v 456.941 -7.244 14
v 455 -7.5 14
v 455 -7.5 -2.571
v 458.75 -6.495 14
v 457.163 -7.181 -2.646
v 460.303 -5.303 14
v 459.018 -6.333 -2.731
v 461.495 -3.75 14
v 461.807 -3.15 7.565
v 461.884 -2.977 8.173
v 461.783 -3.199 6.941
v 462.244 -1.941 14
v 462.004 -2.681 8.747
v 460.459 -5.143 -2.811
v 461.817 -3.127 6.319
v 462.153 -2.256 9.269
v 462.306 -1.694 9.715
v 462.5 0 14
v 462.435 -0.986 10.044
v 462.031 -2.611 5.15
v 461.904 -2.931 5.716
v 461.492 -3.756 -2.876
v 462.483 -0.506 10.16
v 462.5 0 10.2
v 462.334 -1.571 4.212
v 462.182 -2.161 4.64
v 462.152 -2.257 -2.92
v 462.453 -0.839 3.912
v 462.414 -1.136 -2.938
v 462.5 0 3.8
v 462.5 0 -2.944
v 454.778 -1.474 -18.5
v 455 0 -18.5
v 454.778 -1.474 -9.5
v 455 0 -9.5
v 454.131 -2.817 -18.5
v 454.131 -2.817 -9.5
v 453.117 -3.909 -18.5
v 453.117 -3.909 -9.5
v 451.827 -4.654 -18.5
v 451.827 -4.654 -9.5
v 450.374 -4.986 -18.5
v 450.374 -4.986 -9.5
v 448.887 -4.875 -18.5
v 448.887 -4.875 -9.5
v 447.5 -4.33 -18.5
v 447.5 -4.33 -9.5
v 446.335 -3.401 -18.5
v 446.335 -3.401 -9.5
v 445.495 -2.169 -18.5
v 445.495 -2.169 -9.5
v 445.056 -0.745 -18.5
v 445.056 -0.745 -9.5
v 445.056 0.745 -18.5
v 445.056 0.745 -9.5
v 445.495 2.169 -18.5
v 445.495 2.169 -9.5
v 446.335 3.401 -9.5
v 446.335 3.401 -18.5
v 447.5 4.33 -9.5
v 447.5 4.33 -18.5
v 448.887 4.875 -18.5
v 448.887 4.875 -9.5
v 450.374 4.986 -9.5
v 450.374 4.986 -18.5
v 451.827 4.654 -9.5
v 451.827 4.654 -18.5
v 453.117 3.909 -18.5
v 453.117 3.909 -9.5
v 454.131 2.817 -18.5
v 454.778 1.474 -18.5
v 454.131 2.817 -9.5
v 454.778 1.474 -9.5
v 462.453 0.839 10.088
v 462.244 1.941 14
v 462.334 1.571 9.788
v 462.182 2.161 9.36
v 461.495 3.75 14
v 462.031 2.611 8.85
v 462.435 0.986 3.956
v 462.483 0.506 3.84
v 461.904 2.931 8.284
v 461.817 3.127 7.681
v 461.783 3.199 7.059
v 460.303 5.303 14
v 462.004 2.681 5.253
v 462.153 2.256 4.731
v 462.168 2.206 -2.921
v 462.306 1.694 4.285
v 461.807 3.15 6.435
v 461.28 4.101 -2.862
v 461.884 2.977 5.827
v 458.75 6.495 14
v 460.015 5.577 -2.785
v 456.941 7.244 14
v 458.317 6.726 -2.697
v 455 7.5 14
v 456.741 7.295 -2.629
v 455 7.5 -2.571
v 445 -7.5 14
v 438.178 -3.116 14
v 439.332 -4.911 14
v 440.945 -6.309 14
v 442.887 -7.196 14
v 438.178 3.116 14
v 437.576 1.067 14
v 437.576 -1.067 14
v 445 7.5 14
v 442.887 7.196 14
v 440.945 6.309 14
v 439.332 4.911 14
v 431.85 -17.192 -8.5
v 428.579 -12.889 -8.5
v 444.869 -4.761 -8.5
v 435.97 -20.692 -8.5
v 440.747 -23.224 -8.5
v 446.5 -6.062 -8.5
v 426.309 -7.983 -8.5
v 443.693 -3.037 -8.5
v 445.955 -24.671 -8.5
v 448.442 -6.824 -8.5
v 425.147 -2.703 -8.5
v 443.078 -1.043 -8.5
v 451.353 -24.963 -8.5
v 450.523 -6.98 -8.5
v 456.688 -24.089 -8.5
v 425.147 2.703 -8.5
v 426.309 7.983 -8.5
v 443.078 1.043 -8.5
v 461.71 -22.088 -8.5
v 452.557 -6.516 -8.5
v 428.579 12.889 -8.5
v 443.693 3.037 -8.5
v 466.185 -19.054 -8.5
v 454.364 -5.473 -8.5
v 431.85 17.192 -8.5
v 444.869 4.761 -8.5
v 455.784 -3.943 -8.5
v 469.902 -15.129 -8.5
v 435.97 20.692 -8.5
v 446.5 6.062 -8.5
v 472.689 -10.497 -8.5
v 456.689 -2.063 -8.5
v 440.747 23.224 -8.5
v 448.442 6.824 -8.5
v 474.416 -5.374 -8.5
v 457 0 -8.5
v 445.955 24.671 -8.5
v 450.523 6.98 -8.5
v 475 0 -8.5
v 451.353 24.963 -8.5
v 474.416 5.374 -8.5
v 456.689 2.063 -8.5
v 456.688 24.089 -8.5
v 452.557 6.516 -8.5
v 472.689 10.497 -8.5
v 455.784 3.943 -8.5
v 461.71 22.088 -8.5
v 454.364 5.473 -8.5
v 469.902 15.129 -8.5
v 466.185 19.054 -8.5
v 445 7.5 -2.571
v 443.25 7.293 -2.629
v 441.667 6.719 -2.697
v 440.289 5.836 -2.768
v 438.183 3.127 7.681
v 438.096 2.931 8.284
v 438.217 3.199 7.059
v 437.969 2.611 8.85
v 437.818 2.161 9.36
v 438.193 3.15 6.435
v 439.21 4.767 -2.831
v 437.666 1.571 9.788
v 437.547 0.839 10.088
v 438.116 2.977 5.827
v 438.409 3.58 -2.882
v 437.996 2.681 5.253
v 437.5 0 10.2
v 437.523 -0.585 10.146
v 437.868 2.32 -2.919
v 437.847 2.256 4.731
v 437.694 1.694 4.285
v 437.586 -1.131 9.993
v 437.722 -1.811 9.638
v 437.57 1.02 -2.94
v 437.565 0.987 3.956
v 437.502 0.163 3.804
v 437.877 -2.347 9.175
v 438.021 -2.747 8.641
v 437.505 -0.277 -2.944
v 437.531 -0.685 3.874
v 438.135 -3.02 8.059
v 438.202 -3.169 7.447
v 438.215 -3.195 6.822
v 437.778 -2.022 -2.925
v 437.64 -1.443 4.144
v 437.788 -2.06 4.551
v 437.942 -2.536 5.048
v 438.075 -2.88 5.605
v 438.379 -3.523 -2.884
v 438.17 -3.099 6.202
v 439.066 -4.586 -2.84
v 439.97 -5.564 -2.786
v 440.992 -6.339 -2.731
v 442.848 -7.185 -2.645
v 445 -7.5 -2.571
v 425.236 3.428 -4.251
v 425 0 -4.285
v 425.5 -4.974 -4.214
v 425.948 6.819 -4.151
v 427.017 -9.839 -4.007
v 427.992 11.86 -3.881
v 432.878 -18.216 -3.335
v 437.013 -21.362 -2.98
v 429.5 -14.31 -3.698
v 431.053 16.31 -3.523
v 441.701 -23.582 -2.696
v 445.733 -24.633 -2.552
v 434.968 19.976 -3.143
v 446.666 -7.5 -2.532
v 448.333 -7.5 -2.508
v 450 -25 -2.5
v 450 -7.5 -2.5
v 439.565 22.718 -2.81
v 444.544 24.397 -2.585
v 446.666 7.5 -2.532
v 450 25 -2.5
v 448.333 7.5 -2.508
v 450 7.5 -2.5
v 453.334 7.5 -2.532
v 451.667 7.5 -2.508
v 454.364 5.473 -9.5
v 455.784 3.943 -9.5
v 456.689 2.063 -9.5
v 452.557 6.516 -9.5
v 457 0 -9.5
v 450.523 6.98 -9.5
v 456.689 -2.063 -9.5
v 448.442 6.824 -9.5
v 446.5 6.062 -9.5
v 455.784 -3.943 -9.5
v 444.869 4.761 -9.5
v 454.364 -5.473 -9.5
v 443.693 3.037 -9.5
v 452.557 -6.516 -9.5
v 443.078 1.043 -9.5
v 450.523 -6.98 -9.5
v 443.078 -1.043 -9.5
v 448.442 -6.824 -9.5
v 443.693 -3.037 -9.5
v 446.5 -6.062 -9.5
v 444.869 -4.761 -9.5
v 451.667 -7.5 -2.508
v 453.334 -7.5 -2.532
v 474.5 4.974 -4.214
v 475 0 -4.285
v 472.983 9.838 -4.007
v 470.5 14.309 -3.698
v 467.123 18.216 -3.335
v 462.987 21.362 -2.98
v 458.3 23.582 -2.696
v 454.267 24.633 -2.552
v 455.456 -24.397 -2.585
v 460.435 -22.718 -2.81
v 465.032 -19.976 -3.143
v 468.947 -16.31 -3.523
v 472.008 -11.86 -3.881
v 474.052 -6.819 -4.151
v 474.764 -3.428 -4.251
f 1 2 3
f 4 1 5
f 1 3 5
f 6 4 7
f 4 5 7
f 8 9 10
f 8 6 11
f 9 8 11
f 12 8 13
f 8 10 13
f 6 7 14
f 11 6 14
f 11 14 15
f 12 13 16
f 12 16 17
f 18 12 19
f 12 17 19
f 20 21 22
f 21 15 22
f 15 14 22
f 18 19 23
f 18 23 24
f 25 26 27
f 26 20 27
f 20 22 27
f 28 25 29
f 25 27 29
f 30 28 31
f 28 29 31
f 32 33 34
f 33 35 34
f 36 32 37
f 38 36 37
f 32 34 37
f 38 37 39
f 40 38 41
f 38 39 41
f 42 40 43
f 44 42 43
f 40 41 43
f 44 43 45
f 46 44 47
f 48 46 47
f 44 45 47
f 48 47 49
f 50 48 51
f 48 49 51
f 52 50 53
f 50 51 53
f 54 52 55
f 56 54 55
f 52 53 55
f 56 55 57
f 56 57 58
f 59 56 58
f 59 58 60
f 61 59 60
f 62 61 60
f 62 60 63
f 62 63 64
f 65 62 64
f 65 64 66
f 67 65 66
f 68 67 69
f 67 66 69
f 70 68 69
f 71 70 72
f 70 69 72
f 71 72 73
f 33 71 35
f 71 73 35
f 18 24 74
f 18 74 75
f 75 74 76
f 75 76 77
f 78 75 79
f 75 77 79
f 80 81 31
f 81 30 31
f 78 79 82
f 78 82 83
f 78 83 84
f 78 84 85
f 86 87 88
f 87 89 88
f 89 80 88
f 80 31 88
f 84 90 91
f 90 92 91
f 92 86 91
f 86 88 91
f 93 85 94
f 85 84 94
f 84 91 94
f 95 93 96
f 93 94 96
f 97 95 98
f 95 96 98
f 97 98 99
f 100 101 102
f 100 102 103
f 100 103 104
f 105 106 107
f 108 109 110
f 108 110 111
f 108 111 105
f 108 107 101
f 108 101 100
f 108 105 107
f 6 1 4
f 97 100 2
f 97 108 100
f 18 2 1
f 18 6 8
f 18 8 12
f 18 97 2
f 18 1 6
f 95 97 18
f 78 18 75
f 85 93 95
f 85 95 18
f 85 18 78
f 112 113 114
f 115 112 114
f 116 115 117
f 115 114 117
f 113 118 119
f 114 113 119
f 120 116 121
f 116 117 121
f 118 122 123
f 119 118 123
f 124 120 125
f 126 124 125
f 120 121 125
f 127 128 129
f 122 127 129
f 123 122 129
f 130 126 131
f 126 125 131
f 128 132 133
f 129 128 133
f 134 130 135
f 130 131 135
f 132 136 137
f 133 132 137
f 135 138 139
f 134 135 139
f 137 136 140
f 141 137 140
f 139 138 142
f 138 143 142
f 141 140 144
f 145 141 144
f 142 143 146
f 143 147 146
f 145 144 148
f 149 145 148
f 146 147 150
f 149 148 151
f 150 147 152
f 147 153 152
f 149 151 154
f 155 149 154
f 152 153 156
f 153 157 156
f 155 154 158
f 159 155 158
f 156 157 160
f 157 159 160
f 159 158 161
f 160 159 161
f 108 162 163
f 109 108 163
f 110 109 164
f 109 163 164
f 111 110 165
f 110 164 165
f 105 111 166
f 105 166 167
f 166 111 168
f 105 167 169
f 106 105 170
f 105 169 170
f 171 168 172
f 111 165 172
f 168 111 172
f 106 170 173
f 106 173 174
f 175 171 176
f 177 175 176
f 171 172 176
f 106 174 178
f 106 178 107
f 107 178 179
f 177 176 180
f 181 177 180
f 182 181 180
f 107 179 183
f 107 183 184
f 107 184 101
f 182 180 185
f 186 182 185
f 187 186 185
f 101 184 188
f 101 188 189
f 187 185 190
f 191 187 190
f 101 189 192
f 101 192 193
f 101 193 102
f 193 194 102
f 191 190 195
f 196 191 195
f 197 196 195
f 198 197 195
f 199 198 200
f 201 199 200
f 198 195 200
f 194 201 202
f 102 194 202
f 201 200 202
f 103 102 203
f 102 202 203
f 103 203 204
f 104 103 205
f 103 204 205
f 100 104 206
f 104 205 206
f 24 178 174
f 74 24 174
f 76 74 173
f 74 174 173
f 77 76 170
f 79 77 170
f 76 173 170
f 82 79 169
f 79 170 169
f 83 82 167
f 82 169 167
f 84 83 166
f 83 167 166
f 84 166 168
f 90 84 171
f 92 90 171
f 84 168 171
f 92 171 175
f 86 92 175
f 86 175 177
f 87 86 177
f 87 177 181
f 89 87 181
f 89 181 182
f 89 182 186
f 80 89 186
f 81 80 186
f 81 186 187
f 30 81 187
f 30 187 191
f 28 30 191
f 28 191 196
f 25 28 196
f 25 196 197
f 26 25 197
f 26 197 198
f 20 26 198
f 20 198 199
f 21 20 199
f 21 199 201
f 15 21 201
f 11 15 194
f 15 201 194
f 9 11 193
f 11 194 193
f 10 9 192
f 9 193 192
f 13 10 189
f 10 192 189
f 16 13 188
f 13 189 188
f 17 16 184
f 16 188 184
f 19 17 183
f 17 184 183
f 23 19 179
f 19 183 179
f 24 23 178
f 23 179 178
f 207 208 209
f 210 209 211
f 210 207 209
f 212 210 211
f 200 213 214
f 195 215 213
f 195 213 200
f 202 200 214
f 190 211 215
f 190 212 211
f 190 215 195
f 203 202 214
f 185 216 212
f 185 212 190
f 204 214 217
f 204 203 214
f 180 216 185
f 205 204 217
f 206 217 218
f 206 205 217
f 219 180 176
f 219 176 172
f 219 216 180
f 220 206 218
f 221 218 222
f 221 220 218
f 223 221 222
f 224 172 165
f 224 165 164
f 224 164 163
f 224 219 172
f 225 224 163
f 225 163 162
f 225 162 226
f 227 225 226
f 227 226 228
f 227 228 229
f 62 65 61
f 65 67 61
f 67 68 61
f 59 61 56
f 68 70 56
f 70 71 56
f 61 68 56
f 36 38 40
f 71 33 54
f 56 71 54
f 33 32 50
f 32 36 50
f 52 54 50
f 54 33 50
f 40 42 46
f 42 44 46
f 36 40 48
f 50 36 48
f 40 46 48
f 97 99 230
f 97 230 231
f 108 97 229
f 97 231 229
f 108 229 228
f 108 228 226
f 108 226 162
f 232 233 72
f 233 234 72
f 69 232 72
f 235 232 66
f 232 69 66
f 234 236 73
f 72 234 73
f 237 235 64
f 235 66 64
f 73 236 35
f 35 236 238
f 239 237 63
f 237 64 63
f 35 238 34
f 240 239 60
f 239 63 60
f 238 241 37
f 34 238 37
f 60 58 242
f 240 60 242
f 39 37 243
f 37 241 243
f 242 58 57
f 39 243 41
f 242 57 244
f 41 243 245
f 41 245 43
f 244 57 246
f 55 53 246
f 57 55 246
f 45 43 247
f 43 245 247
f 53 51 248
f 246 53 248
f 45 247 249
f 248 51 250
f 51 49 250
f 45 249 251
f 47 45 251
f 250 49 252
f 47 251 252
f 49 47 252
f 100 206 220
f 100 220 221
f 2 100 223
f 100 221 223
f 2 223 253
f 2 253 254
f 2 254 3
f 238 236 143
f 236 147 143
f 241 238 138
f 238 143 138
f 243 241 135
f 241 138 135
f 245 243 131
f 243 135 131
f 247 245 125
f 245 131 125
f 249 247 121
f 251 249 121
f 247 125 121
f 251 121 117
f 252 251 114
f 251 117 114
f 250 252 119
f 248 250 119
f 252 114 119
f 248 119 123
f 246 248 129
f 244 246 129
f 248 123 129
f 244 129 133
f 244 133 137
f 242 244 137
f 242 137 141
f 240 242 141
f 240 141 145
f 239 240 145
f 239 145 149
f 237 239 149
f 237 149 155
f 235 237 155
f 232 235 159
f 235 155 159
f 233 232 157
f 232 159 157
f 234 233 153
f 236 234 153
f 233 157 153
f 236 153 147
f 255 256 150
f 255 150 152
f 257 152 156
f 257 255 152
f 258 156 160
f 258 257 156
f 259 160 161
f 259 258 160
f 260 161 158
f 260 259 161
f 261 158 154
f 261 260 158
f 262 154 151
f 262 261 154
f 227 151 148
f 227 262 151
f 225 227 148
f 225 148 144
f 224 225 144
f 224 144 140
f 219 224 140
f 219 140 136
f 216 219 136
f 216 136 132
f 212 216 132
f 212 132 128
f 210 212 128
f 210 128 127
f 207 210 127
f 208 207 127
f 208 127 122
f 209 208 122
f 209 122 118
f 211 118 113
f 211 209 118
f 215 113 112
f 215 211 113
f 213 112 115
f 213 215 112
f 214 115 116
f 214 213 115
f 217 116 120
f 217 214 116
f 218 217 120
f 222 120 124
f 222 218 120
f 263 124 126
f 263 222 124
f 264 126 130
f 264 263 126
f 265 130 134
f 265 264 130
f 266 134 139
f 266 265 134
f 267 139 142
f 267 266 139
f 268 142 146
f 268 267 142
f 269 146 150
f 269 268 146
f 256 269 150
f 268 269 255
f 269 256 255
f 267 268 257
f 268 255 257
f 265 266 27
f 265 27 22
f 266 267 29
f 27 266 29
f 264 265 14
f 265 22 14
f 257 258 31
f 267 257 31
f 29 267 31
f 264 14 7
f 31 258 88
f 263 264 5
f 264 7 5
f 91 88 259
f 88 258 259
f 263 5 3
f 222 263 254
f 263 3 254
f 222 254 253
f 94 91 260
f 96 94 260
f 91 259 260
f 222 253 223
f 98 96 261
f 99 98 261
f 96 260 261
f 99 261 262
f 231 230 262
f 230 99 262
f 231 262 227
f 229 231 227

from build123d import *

# Parameters (mm, degrees)
AUFSATZ_LINEAR_START             = -2.5
SKIZZE2_R                        = 25
AUFSATZ_LINEAR_AUSTRAGEN1_DEPTH  = 6
SCHNITT_LINEAR_AUSTRAGEN2_DEPTH  = 476.733381213
AUFSATZ_LINEAR_START_2           = -2.944453
AUFSATZ_LINEAR_AUSTRAGEN5_DEPTH  = 16.944453
SPIEGELN4_START                  = -2.944453335
SPIEGELN4_DEPTH                  = 16.944453335
F_6_4_6_4_DURCHMESSER_BOHRUNG1_D = 6.4


# Read off the part's stored shape, not the designer's step: Spiegeln4
with BuildPart() as part:
    # Skizze2 → Aufsatz-Linear austragen1 (new body)
    with BuildSketch(Plane.XY.offset(AUFSATZ_LINEAR_START)):
        with Locations((450, 0)):
            Circle(SKIZZE2_R)
    extrude(amount=-AUFSATZ_LINEAR_AUSTRAGEN1_DEPTH)

    # Skizze8 → Schnitt-Linear austragen2 (cut, symmetric)
    with BuildSketch(Plane(origin=(0, 0, 0), x_dir=(1, 0, 0), z_dir=(0, 1, 0))):
        with BuildLine():
            Line((450, 2.5), (475, 2.5))
            Line((475, 2.5), (475, 4.284616064))
            ThreePointArc((475, 4.284616064), (462.531808075, 2.946720947), (450, 2.5))
        make_face()
    schnitt_linear_austragen2 = extrude(amount=SCHNITT_LINEAR_AUSTRAGEN2_DEPTH, both=True, mode=Mode.SUBTRACT)

    # Spiegeln1: Schnitt-Linear austragen2 across plane
    add(schnitt_linear_austragen2.mirror(Plane(origin=(450, 0, 0), x_dir=(0, 0, 1), z_dir=(1, 0, 0))), mode=Mode.SUBTRACT)

    # Skizze3 → Aufsatz-Linear austragen5 (add)
    with BuildSketch(Plane.XY.offset(AUFSATZ_LINEAR_START_2)):
        with BuildLine():
            Line((450, 0), (462.5, 0))
            ThreePointArc((462.5, 0), (460.303300859, 5.303300859), (455, 7.5))
            Line((455, 7.5), (450, 7.5))
            Line((450, 7.5), (450, 0))
        make_face()
    extrude(amount=AUFSATZ_LINEAR_AUSTRAGEN5_DEPTH)

    # Spiegeln4 outline → Spiegeln4 (add)
    with BuildSketch(Plane.XY.offset(SPIEGELN4_START)):
        with BuildLine():
            ThreePointArc((455, -7.5), (460.303300859, -5.303300859), (462.5, 0))
            Line((462.5, 0), (450, 0))
            Line((450, 0), (450, 7.5))
            Line((450, 7.5), (445, 7.5))
            ThreePointArc((445, 7.5), (437.5, 0), (445, -7.5))
            Line((445, -7.5), (455, -7.5))
        make_face()
    extrude(amount=SPIEGELN4_DEPTH)

    # Skizze4 → Rotation1 (revolve)
    with BuildSketch(Plane(origin=(450, 0, 0), x_dir=(0, 0, -1), z_dir=(1, 0, 0)), mode=Mode.PRIVATE) as rotation1_sk:
        Polygon((9.5, 7), (8.5, 7), (8.5, 0), (18.5, 0), (18.5, 4), (18.5, 5), (9.5, 5), align=None)
    revolve(rotation1_sk.sketch.rotate(Axis((450, 0, -8.5), (0, 0, -1)), 90), axis=Axis((450, 0, -8.5), (0, 0, -1)))

    # Ø6.4 (6.4) Durchmesser Bohrung1 (through all)
    with Locations(Plane(origin=(462.5, 0, 0), x_dir=(0, 0, -1), z_dir=(1, 0, 0))):
        with Locations((-7, 0)):
            Hole(F_6_4_6_4_DURCHMESSER_BOHRUNG1_D / 2)


solid = part.part
